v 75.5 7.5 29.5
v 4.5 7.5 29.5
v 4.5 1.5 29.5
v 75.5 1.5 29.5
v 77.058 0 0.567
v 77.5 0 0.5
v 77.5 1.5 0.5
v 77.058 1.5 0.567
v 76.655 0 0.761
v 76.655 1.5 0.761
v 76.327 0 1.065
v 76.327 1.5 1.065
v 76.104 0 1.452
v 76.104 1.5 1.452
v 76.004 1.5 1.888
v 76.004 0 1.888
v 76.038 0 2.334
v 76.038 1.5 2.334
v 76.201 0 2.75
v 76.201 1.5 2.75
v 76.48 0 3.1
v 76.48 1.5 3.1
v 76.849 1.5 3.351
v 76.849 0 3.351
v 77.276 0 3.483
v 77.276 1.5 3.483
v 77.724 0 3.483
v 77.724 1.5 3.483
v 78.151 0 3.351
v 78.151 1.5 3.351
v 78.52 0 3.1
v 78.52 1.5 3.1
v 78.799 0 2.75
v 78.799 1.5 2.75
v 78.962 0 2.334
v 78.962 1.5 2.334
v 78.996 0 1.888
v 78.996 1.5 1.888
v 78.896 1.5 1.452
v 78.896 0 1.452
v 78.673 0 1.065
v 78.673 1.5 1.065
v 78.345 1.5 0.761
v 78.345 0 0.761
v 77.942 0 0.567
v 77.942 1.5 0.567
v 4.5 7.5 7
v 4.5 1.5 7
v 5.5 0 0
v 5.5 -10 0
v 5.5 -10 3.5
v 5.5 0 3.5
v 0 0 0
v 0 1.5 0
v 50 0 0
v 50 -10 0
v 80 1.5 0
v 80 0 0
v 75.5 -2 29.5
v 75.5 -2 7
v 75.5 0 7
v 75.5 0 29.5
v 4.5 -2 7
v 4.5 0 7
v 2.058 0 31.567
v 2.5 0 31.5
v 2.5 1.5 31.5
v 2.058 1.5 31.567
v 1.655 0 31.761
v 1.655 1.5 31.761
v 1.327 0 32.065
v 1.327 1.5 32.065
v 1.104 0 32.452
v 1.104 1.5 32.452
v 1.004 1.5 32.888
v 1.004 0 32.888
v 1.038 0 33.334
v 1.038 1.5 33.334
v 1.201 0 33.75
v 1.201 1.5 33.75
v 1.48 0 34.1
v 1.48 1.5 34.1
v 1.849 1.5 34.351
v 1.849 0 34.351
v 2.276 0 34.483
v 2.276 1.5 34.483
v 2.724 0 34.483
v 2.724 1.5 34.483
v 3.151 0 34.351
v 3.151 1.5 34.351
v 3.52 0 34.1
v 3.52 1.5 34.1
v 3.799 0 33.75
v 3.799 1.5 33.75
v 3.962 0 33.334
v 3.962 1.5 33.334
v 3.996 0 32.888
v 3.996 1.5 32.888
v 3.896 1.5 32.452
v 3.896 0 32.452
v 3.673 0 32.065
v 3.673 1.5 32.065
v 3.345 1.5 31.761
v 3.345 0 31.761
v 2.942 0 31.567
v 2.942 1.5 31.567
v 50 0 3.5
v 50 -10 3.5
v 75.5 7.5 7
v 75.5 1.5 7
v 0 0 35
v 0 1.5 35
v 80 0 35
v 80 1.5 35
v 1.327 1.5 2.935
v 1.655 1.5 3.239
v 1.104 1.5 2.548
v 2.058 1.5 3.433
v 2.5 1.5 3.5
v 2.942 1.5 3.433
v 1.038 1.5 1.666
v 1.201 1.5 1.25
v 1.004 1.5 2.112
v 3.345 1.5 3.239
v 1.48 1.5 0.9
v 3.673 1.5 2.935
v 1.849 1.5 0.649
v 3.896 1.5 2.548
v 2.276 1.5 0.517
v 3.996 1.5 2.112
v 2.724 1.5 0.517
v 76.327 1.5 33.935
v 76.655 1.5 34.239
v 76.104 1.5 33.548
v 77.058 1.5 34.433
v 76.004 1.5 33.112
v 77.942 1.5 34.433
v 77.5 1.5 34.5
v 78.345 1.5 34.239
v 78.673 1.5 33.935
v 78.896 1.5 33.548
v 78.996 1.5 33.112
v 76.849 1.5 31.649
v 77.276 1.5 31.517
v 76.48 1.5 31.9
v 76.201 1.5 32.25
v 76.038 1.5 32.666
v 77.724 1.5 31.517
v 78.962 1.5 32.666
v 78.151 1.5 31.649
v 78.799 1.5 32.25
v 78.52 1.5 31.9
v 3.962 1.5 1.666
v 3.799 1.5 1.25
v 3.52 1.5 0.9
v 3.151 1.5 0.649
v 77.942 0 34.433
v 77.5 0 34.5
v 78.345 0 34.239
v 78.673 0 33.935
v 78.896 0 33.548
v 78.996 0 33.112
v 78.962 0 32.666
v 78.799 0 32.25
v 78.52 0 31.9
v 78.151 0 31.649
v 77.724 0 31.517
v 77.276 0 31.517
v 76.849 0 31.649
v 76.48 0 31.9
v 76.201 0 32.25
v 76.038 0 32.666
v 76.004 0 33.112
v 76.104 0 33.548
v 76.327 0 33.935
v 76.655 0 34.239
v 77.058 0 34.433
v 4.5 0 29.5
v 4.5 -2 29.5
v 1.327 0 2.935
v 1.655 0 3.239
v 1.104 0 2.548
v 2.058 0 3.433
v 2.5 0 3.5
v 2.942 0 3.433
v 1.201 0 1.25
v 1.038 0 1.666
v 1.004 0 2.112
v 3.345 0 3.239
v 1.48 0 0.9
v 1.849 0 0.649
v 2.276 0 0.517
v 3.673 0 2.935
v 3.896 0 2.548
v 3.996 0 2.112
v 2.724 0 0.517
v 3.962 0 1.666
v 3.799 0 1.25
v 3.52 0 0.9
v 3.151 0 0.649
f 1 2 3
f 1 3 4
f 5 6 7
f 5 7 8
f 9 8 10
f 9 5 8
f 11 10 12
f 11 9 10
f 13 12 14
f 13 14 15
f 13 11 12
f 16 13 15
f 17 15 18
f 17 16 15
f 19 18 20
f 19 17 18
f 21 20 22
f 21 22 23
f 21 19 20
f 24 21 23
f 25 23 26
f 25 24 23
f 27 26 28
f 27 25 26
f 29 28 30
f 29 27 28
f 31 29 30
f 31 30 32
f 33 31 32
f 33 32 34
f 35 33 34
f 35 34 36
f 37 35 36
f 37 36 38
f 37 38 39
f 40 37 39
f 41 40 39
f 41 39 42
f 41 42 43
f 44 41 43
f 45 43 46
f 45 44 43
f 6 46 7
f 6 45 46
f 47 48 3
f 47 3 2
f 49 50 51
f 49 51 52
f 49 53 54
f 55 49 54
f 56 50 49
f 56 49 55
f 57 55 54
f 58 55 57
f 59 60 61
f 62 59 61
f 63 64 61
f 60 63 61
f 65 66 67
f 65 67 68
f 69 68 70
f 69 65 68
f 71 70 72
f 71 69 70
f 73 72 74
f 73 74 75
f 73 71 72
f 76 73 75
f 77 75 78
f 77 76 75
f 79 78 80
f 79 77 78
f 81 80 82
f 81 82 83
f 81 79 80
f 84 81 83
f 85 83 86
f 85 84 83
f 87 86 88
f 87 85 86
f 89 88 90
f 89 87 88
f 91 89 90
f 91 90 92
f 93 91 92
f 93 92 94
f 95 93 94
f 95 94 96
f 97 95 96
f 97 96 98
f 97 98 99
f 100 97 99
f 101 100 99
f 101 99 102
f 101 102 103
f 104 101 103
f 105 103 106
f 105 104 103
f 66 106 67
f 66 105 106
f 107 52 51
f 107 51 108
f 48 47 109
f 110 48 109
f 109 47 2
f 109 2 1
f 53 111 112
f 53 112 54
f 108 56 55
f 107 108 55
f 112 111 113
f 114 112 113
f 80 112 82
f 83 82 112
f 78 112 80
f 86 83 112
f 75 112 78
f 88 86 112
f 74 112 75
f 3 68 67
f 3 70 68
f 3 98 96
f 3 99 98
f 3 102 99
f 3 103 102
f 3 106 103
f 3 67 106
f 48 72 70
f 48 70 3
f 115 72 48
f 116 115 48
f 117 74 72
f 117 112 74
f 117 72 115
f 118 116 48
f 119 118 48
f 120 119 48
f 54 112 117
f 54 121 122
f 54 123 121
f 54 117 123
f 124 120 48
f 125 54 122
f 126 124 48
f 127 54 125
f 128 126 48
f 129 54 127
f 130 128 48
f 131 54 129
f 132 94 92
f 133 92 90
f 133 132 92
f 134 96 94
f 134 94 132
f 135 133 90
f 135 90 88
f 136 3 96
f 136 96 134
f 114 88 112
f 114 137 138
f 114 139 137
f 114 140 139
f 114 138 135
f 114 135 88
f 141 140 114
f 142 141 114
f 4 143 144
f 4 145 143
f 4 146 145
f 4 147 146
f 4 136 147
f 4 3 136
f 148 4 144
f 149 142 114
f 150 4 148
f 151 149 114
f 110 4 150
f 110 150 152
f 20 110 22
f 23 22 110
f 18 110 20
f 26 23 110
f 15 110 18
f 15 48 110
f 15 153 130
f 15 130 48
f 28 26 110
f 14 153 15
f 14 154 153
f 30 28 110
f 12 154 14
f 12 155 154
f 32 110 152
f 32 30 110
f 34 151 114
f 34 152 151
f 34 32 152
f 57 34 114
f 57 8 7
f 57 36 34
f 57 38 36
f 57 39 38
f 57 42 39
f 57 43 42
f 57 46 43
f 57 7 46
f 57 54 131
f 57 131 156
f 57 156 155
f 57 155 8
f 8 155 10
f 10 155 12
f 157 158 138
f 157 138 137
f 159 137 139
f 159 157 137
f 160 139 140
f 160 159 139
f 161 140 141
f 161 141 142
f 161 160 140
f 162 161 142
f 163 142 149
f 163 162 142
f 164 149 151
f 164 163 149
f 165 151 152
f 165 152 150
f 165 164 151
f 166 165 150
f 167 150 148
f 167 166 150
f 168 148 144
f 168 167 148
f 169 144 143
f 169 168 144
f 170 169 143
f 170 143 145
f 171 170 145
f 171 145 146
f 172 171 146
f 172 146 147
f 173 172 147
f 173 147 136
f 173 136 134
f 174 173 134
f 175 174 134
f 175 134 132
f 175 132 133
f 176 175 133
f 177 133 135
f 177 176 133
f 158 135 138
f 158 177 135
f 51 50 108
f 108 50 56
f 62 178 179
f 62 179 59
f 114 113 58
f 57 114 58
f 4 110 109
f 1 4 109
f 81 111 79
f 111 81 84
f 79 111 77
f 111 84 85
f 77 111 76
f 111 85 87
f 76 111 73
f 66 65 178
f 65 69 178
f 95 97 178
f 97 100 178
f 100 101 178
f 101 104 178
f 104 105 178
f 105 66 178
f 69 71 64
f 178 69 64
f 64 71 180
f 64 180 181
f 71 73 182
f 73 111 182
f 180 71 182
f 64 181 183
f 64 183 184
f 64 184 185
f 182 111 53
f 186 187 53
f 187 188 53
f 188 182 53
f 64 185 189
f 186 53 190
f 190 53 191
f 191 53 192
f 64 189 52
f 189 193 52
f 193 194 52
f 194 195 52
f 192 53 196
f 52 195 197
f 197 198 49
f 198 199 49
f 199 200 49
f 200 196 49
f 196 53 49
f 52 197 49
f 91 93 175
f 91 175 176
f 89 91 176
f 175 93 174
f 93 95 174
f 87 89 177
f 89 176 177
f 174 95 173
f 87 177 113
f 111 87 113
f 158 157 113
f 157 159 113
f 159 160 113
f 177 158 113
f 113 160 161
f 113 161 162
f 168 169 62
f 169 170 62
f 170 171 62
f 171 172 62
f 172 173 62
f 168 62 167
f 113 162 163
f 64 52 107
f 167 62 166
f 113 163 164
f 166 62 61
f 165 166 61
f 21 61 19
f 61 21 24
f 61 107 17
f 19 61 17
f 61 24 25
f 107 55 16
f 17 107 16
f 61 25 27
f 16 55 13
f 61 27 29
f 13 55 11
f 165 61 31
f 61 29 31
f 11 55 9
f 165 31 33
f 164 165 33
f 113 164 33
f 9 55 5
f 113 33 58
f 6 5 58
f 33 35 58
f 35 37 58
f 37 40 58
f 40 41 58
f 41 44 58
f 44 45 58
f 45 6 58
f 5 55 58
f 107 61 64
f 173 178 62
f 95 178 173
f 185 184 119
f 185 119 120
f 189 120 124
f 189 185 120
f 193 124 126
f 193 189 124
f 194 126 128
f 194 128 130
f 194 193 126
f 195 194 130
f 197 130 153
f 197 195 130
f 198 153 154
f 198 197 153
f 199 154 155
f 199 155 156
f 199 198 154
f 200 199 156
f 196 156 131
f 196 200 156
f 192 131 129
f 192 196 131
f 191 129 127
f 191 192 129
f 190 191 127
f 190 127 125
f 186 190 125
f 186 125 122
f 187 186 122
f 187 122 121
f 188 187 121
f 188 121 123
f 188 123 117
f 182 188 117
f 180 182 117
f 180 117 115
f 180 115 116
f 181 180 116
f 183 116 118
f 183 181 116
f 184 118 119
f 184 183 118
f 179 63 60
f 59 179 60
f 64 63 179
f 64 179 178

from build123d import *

# Parameters (mm, degrees)
SKETCH_1_W            = 80
SKETCH_1_H            = 35
SKETCH_1_R            = 1.5
EXTRUDE_1_DEPTH       = 1.5
EXTRUDE_START         = 7
EXTRUDE_2_OUTLINE_W   = 71
EXTRUDE_2_OUTLINE_H   = 6
EXTRUDE_2_OUTLINE_H_2 = 2
EXTRUDE_2_DEPTH       = 22.5
EXTRUDE_2_2_OUTLINE_W = 44.5
EXTRUDE_2_2_OUTLINE_H = 10
EXTRUDE_2_2_DEPTH     = 3.5


# Read off the part's stored shape, not the designer's step: Бобышка-Вытянуть2
with BuildPart() as part:
    # Эскиз1 (on Top Plane) → Бобышка-Вытянуть1 (new body)
    with BuildSketch(Plane(origin=(0, 0, 0), x_dir=(1, 0, 0), z_dir=(0, 1, 0))):
        with Locations((40, -17.5)):
            Rectangle(SKETCH_1_W, SKETCH_1_H)
        with Locations(Location((2.5, -2, 0), (0, 0, 270))):
            Circle(SKETCH_1_R, mode=Mode.SUBTRACT)
        with Locations(Location((77.5, -2, 0), (0, 0, 90))):
            Circle(SKETCH_1_R, mode=Mode.SUBTRACT)
        with Locations(Location((77.5, -33, 0), (0, 0, 270))):
            Circle(SKETCH_1_R, mode=Mode.SUBTRACT)
        with Locations(Location((2.5, -33, 0), (0, 0, 90))):
            Circle(SKETCH_1_R, mode=Mode.SUBTRACT)
    extrude(amount=EXTRUDE_1_DEPTH)

    # Бобышка-Вытянуть2 outline → Бобышка-Вытянуть2 (add)
    with BuildSketch(Plane.XY.offset(EXTRUDE_START)):
        with Locations((40, 4.5)):
            Rectangle(EXTRUDE_2_OUTLINE_W, EXTRUDE_2_OUTLINE_H)
        with Locations((40, -1)):
            Rectangle(EXTRUDE_2_OUTLINE_W, EXTRUDE_2_OUTLINE_H_2)
    extrude(amount=EXTRUDE_2_DEPTH)

    # Extrude 2 2 outline → Extrude 2 2 (add)
    with BuildSketch(Plane.XY):
        with Locations((27.75, -5)):
            Rectangle(EXTRUDE_2_2_OUTLINE_W, EXTRUDE_2_2_OUTLINE_H)
    extrude(amount=EXTRUDE_2_2_DEPTH)


solid = part.part
